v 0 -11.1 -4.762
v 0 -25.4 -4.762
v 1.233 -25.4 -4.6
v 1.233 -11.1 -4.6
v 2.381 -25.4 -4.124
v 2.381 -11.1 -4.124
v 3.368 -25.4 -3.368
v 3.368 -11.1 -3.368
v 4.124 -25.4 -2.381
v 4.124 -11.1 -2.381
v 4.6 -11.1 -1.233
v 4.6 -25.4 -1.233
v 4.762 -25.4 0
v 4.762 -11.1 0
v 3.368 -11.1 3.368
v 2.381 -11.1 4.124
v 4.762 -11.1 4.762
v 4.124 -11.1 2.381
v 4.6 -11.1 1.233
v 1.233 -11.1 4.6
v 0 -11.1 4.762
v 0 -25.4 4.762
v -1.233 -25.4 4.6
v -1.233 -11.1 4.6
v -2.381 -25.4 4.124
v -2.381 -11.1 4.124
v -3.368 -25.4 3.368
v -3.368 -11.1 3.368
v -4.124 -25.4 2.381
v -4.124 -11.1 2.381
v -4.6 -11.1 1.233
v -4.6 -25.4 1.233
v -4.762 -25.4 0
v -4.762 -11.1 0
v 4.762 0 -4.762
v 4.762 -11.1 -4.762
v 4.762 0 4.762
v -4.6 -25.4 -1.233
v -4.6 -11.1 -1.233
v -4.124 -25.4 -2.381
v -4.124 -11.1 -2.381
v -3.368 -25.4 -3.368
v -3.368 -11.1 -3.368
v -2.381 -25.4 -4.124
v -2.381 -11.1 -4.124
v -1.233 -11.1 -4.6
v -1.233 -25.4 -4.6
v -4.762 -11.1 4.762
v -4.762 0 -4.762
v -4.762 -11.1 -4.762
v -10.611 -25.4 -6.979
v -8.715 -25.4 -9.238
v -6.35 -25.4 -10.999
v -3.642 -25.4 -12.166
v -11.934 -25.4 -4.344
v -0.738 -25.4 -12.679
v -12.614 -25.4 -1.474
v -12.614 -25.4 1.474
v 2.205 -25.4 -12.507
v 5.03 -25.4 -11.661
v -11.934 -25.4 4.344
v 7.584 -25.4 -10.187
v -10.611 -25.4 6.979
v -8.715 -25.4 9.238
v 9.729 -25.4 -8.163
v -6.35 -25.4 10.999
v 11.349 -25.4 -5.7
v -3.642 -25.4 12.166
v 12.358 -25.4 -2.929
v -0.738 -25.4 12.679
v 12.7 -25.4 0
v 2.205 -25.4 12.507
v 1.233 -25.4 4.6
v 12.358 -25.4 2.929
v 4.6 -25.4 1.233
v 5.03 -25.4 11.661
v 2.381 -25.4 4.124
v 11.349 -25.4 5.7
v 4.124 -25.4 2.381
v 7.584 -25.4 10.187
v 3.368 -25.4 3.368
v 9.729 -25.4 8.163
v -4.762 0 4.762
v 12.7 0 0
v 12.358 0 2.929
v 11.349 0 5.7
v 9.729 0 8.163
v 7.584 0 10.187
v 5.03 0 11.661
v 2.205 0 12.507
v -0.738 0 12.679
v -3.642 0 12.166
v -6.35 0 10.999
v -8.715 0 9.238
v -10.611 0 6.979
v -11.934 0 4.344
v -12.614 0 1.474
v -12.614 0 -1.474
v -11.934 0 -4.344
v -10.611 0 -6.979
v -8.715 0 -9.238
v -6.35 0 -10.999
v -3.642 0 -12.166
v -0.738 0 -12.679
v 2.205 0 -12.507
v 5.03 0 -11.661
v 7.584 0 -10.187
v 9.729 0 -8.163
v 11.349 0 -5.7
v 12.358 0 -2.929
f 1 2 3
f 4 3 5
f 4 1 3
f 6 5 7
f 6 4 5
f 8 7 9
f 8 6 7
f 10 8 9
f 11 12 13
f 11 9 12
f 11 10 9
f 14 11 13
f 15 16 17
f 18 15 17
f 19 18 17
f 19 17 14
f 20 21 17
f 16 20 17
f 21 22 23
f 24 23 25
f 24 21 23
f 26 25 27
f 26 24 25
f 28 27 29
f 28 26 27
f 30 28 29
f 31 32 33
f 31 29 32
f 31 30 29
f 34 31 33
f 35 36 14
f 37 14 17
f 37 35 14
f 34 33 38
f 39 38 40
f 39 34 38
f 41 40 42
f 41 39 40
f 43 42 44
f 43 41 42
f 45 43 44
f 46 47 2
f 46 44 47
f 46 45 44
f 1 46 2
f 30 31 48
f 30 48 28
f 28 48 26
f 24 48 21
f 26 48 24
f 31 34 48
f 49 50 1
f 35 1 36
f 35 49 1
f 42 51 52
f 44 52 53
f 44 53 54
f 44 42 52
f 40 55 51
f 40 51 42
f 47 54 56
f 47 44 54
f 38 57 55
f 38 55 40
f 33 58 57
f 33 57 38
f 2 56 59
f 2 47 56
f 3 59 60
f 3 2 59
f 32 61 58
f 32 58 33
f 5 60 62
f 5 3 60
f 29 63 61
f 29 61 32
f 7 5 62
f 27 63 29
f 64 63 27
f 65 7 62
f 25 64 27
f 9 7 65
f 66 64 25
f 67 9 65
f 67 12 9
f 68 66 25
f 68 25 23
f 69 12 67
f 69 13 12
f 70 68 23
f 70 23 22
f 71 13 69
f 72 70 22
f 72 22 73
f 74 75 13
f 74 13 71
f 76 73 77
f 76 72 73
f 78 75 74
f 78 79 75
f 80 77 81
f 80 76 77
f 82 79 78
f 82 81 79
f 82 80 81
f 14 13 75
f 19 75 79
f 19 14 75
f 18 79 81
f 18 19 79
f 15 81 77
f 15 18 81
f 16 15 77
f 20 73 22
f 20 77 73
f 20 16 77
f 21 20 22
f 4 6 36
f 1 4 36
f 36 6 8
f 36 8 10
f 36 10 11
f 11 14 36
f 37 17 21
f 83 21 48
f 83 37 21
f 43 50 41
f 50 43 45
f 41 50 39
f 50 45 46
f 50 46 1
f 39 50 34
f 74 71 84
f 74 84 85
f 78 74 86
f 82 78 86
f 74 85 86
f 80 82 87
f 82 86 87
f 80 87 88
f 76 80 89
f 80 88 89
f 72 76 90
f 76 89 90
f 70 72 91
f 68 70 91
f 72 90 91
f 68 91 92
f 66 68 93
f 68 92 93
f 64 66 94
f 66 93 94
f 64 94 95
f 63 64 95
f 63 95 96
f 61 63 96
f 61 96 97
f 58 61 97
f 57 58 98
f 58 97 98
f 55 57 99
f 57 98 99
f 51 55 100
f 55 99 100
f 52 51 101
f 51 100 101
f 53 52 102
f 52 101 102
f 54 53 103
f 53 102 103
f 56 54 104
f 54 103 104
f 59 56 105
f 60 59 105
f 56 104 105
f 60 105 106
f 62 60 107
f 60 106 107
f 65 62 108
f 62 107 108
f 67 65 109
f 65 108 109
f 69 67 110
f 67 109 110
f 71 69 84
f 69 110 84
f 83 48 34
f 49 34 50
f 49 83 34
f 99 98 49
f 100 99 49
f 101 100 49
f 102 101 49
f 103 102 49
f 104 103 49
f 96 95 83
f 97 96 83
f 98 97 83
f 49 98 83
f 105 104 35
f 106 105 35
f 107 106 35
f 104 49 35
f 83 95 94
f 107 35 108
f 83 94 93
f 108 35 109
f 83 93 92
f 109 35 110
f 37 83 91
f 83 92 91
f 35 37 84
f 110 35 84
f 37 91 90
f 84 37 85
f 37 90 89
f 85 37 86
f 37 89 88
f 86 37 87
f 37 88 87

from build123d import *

# Parameters (mm, degrees)
F0_R      = 12.7
F1_DEPTH  = 25.4
F1_FACE_R = 12.7
F3_DEPTH  = 25.4
F4_DEPTH  = 25.401
F5_DEPTH  = 11.0998


with BuildPart() as f1:
    # F0 (on Front) → F1 (new body)
    with BuildSketch(Plane.XZ):
        Circle(F0_R)
    extrude(amount=F1_DEPTH)

    # F1_face (on face) → F3 (cut)
    with BuildSketch(Plane.XZ.offset(25.4)):
        Circle(F1_FACE_R)
    extrude(amount=F3_DEPTH, mode=Mode.SUBTRACT)

    # F2 (on Front) → F4 (cut, through all)
    with BuildSketch(Plane.XZ):
        with BuildLine():
            ThreePointArc((4.7625, 0), (3.367596, 3.367596), (0, 4.7625))
            ThreePointArc((0, 4.7625), (-3.367596, 3.367596), (-4.7625, 0))
            ThreePointArc((-4.7625, 0), (-3.367596, -3.367596), (0, -4.7625))
            ThreePointArc((0, -4.7625), (3.367596, -3.367596), (4.7625, 0))
        make_face()
    extrude(amount=F4_DEPTH, mode=Mode.SUBTRACT)

    # F2 (on Front) → F5 (cut)
    with BuildSketch(Plane.XZ):
        with BuildLine():
            Line((4.7625, 0), (4.7625, 4.7625))
            Line((4.7625, 4.7625), (0, 4.7625))
            ThreePointArc((0, 4.7625), (3.367596, 3.367596), (4.7625, 0))
        make_face()
        with BuildLine():
            ThreePointArc((-4.7625, 0), (-3.367596, 3.367596), (0, 4.7625))
            Line((0, 4.7625), (-4.7625, 4.7625))
            Line((-4.7625, 4.7625), (-4.7625, 0))
        make_face()
        with BuildLine():
            Line((4.7625, -4.7625), (4.7625, 0))
            ThreePointArc((4.7625, 0), (3.367596, -3.367596), (0, -4.7625))
            Line((0, -4.7625), (4.7625, -4.7625))
        make_face()
        with BuildLine():
            ThreePointArc((0, -4.7625), (-3.367596, -3.367596), (-4.7625, 0))
            Line((-4.7625, 0), (-4.7625, -4.7625))
            Line((-4.7625, -4.7625), (0, -4.7625))
        make_face()
    extrude(amount=F5_DEPTH, mode=Mode.SUBTRACT)


solid = f1.part
